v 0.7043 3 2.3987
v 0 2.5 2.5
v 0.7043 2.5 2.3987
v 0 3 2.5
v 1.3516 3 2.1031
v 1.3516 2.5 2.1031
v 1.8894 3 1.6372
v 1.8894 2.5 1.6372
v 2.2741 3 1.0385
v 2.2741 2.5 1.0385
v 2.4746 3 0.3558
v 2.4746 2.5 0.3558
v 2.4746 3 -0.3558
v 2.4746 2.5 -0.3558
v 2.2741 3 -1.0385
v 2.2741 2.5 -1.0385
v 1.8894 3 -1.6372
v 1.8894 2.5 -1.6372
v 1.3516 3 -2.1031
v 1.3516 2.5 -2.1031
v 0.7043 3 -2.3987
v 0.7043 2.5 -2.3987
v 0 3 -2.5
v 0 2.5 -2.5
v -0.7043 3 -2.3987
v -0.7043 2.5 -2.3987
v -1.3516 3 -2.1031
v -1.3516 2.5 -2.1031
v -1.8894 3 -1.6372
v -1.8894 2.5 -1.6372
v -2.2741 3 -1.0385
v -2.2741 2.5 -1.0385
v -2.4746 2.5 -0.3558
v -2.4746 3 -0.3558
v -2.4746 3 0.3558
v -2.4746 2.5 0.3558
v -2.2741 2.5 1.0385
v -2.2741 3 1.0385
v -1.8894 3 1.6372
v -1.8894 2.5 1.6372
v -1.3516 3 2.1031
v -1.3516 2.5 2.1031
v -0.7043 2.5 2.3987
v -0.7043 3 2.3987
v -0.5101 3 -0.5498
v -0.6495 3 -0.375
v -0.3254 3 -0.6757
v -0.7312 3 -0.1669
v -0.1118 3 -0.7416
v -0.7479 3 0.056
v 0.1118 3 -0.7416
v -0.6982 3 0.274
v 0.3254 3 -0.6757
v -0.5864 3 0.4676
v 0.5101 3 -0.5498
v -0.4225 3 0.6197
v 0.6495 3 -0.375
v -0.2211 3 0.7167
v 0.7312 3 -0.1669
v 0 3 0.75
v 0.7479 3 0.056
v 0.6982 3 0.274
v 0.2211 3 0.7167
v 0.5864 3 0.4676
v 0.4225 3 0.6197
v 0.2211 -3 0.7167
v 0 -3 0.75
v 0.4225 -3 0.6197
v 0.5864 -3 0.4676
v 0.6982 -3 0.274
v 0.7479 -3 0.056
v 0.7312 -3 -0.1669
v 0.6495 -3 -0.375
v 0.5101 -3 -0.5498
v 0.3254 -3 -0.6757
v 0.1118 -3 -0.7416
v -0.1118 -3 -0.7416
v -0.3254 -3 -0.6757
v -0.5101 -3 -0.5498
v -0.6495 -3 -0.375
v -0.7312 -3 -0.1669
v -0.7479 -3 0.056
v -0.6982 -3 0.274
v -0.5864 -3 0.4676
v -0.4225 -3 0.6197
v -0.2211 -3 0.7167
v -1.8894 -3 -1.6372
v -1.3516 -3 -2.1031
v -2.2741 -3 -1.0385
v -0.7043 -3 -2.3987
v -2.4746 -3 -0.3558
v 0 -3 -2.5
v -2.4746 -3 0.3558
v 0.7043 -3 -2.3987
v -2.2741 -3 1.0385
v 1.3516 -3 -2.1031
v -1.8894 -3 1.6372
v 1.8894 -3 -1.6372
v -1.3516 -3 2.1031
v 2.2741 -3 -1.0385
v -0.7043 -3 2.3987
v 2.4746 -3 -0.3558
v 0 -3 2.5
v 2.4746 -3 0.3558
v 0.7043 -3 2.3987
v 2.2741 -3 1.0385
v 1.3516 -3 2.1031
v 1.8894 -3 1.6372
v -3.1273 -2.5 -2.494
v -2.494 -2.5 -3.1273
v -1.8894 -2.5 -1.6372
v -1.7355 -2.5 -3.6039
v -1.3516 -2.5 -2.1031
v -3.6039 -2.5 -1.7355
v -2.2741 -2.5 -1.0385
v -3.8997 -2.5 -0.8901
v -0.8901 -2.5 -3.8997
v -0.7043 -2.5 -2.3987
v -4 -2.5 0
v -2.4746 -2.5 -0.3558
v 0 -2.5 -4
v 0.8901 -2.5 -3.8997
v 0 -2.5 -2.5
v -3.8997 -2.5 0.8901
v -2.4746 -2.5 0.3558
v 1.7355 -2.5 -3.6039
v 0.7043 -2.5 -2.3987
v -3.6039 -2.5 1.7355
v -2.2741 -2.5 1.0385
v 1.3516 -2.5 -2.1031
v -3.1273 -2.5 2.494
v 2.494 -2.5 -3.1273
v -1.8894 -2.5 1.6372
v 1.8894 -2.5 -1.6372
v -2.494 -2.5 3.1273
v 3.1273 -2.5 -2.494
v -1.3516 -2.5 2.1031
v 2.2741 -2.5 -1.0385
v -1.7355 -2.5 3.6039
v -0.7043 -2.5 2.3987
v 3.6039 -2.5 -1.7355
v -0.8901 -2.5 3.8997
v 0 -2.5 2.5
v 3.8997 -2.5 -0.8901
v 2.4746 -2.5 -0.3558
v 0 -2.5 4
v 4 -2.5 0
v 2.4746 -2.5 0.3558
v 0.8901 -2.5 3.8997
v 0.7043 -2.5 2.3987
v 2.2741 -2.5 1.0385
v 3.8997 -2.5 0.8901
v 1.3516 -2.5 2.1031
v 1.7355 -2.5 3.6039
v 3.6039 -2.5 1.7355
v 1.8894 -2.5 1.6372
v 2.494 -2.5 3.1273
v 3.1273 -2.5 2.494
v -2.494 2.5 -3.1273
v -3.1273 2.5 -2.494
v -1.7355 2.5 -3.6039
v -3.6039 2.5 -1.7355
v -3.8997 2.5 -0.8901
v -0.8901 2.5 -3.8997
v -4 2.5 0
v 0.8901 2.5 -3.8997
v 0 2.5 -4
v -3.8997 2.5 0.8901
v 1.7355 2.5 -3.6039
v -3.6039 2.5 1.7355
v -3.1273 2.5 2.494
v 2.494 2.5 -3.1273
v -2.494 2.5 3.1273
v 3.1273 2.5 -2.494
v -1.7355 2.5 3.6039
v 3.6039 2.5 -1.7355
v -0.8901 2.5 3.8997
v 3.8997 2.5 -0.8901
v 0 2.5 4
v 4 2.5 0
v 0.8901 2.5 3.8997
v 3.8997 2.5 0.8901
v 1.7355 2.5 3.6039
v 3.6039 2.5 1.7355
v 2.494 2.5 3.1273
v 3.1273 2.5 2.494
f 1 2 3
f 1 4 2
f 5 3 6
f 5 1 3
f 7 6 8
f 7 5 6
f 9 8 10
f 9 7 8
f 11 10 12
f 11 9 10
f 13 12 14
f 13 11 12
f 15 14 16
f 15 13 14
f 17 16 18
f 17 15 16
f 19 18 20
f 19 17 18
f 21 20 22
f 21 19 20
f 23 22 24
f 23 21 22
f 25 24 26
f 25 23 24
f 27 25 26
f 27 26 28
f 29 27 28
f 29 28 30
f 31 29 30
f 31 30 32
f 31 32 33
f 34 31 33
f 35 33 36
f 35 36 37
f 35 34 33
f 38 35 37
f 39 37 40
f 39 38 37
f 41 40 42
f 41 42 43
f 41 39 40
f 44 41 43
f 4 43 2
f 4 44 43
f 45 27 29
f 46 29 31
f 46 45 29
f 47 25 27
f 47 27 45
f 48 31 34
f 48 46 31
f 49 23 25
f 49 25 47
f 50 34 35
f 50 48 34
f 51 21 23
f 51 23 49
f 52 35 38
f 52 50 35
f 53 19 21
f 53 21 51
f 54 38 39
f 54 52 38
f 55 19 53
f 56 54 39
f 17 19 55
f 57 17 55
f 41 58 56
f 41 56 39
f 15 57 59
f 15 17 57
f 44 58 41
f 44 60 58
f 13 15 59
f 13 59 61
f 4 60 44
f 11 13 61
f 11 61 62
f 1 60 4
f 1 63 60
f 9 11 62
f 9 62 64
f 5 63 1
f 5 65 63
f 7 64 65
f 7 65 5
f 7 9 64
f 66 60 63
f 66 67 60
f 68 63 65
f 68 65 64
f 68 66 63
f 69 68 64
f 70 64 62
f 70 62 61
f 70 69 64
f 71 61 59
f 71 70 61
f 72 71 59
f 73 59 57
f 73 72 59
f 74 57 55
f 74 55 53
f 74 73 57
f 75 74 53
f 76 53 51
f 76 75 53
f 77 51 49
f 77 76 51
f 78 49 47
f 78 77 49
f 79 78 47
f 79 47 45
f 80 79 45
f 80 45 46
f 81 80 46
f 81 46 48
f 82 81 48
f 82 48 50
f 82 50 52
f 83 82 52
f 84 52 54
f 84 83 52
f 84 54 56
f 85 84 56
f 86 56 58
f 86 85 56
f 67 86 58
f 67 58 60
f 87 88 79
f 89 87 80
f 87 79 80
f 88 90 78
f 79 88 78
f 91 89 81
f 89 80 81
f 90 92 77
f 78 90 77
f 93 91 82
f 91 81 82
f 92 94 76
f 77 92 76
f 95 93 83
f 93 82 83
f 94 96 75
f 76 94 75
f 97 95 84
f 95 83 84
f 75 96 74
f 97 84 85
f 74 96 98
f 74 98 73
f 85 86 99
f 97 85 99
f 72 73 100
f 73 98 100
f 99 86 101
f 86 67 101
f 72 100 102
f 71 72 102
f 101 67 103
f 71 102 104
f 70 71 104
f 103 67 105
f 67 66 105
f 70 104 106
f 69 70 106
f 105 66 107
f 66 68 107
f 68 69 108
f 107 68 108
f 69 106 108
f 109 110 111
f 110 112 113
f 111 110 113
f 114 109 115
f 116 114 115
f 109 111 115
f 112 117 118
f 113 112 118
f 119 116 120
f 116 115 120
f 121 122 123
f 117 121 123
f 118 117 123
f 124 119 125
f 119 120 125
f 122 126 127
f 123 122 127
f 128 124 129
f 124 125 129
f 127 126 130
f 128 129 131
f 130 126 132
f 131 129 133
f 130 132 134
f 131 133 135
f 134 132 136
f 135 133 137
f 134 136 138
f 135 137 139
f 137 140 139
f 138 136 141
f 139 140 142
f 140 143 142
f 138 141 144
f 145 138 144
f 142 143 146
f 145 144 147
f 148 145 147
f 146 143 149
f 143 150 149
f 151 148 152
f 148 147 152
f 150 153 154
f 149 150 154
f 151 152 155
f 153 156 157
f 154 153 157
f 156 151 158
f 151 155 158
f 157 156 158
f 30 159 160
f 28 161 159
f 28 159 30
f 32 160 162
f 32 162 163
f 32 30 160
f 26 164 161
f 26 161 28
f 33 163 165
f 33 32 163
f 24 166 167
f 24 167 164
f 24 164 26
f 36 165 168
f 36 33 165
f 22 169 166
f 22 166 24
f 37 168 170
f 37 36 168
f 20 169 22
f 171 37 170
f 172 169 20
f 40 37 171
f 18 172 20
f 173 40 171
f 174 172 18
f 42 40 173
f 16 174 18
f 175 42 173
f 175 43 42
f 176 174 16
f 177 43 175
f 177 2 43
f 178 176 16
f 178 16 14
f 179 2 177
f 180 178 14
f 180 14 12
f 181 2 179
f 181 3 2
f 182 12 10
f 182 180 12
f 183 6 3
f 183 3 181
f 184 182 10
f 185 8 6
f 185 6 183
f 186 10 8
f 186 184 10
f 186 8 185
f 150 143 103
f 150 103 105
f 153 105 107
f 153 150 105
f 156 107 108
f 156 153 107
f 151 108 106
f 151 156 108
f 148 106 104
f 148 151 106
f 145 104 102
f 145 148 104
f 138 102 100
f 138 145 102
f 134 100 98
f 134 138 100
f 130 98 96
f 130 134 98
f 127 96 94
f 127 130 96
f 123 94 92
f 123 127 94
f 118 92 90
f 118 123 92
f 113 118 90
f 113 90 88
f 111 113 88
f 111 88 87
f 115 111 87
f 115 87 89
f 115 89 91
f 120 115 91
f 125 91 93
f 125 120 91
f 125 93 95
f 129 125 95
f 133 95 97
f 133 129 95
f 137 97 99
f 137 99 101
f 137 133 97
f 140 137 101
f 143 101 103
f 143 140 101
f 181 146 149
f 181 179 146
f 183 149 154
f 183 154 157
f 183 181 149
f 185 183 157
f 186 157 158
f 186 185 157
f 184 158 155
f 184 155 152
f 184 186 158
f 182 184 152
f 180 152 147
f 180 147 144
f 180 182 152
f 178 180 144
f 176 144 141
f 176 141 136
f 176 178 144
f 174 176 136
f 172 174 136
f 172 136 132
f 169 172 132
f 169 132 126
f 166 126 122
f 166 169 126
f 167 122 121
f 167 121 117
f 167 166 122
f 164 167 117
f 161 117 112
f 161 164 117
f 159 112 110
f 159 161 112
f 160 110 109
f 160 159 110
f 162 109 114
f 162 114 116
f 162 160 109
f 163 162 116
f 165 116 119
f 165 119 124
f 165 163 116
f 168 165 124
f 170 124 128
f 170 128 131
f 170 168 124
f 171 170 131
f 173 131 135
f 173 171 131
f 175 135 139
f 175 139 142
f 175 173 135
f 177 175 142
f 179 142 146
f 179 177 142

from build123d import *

# Parameters (mm, degrees)
SKETCH_1_R      = 2.5
SKETCH_1_R_2    = 0.75
EXTRUDE_1_DEPTH = 3
SKETCH_2_R      = 4
SKETCH_2_R_2    = 2.5
EXTRUDE_2_DEPTH = 2.5


with BuildPart() as part:
    # 草图1 → 凸台-拉伸1 (new, symmetric)
    with BuildSketch(Plane(origin=(0, 0, 0), x_dir=(1, 0, 0), z_dir=(0, 1, 0))):
        with Locations(Location((0, 0, 0), (0, 0, 270))):
            Circle(SKETCH_1_R)
        with Locations(Location((0, 0, 0), (0, 0, 270))):
            Circle(SKETCH_1_R_2, mode=Mode.SUBTRACT)
    extrude(amount=EXTRUDE_1_DEPTH, both=True)

    # 草图2 → 凸台-拉伸2 (add, symmetric)
    with BuildSketch(Plane(origin=(0, 0, 0), x_dir=(1, 0, 0), z_dir=(0, 1, 0))):
        with Locations(Location((0, 0, 0), (0, 0, 270))):
            Circle(SKETCH_2_R)
        with Locations(Location((0, 0, 0), (0, 0, 270))):
            Circle(SKETCH_2_R_2, mode=Mode.SUBTRACT)
    extrude(amount=EXTRUDE_2_DEPTH, both=True)


solid = part.part
